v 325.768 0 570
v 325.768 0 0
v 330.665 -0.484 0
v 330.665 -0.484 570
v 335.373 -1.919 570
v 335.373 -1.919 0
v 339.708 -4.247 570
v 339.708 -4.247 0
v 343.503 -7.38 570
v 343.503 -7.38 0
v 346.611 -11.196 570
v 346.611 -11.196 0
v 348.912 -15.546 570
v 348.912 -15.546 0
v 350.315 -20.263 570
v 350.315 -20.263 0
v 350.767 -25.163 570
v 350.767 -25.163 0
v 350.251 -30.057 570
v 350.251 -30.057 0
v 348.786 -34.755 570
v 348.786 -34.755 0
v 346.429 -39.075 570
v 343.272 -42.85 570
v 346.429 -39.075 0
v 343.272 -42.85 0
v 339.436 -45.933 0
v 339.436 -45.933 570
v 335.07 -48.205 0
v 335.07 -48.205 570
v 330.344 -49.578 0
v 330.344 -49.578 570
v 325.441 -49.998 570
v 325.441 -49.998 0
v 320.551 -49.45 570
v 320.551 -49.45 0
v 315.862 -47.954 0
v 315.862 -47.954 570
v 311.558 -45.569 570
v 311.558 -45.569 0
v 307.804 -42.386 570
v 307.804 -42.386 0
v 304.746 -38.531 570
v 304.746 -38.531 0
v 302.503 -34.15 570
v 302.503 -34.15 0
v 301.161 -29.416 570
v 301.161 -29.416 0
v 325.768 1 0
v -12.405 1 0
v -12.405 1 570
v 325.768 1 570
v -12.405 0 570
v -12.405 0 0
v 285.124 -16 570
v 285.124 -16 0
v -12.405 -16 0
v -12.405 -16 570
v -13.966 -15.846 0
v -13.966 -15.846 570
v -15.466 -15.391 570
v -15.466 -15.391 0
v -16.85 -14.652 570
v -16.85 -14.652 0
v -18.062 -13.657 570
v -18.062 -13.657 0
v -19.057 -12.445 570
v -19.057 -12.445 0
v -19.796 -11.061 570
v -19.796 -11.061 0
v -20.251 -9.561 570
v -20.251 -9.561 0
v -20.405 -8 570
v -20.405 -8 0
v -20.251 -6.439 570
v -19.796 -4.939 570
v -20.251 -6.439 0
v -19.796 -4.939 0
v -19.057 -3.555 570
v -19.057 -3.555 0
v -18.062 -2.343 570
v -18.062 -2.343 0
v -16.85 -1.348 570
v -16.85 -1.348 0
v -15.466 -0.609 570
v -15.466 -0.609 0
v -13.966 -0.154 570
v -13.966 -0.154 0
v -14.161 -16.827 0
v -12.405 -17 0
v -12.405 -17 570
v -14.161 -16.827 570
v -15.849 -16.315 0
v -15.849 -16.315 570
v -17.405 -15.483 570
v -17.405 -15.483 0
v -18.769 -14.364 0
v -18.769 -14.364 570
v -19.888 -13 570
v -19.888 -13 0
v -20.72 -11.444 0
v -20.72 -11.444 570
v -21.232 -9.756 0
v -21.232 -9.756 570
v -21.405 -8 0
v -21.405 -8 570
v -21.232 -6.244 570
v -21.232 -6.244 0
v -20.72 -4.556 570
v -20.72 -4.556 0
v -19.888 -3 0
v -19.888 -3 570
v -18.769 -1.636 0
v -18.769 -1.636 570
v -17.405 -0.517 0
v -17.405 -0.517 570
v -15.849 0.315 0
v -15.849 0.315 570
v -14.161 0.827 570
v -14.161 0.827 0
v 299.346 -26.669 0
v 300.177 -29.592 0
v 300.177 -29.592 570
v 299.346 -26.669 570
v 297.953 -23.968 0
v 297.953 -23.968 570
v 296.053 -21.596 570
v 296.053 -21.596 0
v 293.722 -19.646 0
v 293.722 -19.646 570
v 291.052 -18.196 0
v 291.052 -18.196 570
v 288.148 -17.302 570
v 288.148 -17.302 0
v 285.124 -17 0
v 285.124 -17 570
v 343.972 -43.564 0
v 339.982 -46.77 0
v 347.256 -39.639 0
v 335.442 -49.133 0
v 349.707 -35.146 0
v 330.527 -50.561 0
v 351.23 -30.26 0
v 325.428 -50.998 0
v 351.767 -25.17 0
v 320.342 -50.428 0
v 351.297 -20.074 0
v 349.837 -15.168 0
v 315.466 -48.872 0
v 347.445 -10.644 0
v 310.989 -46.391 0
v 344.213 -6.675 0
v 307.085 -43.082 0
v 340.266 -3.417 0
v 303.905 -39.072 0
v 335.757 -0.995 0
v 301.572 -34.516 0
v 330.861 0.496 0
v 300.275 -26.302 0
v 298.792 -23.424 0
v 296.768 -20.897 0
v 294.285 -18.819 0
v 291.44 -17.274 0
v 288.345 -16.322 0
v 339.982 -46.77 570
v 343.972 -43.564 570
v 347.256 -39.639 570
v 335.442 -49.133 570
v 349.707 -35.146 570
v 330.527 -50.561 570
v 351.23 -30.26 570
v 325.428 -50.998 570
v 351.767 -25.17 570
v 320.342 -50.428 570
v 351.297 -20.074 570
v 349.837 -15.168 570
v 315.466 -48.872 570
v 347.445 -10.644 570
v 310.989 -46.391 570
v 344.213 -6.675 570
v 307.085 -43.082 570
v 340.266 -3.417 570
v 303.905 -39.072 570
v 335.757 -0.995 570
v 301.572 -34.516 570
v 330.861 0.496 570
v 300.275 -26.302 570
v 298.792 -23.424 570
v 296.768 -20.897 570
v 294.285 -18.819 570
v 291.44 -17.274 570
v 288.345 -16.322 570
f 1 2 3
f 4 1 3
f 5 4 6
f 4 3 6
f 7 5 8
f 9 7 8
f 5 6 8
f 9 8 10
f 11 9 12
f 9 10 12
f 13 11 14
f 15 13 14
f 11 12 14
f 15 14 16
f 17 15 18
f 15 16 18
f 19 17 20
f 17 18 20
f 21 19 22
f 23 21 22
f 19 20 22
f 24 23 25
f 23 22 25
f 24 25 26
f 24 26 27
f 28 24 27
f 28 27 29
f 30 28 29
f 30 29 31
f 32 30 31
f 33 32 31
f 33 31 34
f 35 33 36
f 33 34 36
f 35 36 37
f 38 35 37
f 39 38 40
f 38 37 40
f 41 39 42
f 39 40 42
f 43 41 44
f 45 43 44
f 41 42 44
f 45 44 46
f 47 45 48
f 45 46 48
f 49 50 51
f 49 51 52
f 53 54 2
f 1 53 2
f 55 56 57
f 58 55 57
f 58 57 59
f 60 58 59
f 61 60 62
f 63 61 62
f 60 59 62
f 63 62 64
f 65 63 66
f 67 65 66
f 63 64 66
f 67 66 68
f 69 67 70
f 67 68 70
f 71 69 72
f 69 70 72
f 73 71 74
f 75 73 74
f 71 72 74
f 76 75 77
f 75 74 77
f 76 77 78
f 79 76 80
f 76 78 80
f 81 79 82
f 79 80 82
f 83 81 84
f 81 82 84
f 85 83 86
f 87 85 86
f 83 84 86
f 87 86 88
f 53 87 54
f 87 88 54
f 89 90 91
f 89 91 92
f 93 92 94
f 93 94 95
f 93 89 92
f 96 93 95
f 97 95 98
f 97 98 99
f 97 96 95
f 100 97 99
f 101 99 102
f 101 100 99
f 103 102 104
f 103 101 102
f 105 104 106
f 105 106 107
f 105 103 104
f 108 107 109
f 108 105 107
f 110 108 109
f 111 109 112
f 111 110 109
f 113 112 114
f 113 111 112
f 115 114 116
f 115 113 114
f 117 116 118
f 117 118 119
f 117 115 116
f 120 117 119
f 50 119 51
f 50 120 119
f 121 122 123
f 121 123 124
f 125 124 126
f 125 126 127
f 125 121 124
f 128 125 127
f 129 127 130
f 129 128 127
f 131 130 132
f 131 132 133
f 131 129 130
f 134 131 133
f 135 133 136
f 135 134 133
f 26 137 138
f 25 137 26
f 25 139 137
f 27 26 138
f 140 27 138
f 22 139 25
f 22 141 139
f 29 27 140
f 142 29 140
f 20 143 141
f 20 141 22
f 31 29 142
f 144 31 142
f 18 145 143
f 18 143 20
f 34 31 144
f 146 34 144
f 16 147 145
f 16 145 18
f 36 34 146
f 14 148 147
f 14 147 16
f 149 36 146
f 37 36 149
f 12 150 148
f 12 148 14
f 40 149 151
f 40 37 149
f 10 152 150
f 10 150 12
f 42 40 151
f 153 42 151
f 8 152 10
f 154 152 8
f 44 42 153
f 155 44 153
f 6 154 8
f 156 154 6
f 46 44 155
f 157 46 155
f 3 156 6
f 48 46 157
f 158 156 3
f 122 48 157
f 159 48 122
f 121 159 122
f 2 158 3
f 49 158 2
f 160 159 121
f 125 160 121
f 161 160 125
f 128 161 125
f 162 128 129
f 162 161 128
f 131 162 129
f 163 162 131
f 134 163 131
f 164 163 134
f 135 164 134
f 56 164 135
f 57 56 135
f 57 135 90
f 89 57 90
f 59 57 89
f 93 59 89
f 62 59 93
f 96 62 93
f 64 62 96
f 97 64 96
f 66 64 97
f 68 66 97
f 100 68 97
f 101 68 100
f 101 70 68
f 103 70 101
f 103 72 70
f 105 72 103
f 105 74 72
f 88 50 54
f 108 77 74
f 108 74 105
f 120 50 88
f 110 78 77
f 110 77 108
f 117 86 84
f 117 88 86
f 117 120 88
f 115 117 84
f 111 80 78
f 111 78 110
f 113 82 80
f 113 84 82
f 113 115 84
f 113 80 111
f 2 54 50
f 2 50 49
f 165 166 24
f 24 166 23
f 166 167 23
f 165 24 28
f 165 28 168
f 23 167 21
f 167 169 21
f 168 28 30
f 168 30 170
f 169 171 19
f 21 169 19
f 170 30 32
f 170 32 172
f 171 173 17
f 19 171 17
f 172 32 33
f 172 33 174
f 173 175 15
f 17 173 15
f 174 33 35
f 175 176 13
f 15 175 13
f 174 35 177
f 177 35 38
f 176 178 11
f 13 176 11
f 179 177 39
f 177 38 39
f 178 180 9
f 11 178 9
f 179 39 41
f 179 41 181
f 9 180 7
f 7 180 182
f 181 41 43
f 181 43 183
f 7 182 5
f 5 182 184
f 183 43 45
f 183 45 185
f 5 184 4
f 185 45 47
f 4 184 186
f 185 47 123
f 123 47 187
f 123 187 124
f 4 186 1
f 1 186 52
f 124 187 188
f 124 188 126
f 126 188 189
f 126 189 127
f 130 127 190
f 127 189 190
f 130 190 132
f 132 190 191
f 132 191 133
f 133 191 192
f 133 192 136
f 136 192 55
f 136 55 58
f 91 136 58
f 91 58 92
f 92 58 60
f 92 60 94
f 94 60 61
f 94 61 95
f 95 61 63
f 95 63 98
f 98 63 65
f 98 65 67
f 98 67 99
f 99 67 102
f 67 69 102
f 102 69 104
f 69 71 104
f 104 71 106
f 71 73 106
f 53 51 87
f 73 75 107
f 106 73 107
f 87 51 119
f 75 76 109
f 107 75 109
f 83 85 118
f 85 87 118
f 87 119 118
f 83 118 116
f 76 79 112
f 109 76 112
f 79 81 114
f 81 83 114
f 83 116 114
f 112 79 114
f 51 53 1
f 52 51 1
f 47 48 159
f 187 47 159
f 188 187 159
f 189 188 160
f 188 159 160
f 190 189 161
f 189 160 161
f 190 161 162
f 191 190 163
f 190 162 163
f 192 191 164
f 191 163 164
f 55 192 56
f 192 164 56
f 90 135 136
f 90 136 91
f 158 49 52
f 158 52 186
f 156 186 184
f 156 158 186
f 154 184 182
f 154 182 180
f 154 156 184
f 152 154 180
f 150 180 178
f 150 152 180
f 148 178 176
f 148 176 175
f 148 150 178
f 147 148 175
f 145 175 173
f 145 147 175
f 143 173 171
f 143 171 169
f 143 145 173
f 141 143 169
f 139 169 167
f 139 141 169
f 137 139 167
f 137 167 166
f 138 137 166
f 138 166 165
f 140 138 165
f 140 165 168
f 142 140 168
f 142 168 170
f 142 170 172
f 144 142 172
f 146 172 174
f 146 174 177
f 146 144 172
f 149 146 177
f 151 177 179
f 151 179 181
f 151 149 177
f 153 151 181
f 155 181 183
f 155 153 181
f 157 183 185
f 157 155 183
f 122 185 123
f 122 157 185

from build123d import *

# Parameters (mm, degrees)
EXTRUDE_1_DEPTH = 570


with BuildPart() as part:
    # 草图1 → 凸台-拉伸1 (new body)
    with BuildSketch(Plane.XY):
        with BuildLine():
            Line((-12.404964531, 1), (325.76800896, 1))
            ThreePointArc((325.76800896, 1), (345.710427238, -41.682324575), (300.176786305, -29.59231129))
            ThreePointArc((300.176786305, -29.59231129), (294.936443949, -20.563156945), (285.123660003, -17))
            Line((285.123660003, -17), (-12.404964531, -17))
            ThreePointArc((-12.404964531, -17), (-21.404964531, -8), (-12.404964531, 1))
        make_face()
        with BuildLine():
            Line((-12.404964531, 0), (325.76800896, 0))
            ThreePointArc((325.76800896, 0), (344.943411151, -41.040696707), (301.161064099, -29.415683933))
            ThreePointArc((301.161064099, -29.415683933), (295.578071817, -19.796140858), (285.123660003, -16))
            Line((285.123660003, -16), (-12.404964531, -16))
            ThreePointArc((-12.404964531, -16), (-20.404964531, -8), (-12.404964531, 0))
        make_face(mode=Mode.SUBTRACT)
    extrude(amount=EXTRUDE_1_DEPTH)


solid = part.part
